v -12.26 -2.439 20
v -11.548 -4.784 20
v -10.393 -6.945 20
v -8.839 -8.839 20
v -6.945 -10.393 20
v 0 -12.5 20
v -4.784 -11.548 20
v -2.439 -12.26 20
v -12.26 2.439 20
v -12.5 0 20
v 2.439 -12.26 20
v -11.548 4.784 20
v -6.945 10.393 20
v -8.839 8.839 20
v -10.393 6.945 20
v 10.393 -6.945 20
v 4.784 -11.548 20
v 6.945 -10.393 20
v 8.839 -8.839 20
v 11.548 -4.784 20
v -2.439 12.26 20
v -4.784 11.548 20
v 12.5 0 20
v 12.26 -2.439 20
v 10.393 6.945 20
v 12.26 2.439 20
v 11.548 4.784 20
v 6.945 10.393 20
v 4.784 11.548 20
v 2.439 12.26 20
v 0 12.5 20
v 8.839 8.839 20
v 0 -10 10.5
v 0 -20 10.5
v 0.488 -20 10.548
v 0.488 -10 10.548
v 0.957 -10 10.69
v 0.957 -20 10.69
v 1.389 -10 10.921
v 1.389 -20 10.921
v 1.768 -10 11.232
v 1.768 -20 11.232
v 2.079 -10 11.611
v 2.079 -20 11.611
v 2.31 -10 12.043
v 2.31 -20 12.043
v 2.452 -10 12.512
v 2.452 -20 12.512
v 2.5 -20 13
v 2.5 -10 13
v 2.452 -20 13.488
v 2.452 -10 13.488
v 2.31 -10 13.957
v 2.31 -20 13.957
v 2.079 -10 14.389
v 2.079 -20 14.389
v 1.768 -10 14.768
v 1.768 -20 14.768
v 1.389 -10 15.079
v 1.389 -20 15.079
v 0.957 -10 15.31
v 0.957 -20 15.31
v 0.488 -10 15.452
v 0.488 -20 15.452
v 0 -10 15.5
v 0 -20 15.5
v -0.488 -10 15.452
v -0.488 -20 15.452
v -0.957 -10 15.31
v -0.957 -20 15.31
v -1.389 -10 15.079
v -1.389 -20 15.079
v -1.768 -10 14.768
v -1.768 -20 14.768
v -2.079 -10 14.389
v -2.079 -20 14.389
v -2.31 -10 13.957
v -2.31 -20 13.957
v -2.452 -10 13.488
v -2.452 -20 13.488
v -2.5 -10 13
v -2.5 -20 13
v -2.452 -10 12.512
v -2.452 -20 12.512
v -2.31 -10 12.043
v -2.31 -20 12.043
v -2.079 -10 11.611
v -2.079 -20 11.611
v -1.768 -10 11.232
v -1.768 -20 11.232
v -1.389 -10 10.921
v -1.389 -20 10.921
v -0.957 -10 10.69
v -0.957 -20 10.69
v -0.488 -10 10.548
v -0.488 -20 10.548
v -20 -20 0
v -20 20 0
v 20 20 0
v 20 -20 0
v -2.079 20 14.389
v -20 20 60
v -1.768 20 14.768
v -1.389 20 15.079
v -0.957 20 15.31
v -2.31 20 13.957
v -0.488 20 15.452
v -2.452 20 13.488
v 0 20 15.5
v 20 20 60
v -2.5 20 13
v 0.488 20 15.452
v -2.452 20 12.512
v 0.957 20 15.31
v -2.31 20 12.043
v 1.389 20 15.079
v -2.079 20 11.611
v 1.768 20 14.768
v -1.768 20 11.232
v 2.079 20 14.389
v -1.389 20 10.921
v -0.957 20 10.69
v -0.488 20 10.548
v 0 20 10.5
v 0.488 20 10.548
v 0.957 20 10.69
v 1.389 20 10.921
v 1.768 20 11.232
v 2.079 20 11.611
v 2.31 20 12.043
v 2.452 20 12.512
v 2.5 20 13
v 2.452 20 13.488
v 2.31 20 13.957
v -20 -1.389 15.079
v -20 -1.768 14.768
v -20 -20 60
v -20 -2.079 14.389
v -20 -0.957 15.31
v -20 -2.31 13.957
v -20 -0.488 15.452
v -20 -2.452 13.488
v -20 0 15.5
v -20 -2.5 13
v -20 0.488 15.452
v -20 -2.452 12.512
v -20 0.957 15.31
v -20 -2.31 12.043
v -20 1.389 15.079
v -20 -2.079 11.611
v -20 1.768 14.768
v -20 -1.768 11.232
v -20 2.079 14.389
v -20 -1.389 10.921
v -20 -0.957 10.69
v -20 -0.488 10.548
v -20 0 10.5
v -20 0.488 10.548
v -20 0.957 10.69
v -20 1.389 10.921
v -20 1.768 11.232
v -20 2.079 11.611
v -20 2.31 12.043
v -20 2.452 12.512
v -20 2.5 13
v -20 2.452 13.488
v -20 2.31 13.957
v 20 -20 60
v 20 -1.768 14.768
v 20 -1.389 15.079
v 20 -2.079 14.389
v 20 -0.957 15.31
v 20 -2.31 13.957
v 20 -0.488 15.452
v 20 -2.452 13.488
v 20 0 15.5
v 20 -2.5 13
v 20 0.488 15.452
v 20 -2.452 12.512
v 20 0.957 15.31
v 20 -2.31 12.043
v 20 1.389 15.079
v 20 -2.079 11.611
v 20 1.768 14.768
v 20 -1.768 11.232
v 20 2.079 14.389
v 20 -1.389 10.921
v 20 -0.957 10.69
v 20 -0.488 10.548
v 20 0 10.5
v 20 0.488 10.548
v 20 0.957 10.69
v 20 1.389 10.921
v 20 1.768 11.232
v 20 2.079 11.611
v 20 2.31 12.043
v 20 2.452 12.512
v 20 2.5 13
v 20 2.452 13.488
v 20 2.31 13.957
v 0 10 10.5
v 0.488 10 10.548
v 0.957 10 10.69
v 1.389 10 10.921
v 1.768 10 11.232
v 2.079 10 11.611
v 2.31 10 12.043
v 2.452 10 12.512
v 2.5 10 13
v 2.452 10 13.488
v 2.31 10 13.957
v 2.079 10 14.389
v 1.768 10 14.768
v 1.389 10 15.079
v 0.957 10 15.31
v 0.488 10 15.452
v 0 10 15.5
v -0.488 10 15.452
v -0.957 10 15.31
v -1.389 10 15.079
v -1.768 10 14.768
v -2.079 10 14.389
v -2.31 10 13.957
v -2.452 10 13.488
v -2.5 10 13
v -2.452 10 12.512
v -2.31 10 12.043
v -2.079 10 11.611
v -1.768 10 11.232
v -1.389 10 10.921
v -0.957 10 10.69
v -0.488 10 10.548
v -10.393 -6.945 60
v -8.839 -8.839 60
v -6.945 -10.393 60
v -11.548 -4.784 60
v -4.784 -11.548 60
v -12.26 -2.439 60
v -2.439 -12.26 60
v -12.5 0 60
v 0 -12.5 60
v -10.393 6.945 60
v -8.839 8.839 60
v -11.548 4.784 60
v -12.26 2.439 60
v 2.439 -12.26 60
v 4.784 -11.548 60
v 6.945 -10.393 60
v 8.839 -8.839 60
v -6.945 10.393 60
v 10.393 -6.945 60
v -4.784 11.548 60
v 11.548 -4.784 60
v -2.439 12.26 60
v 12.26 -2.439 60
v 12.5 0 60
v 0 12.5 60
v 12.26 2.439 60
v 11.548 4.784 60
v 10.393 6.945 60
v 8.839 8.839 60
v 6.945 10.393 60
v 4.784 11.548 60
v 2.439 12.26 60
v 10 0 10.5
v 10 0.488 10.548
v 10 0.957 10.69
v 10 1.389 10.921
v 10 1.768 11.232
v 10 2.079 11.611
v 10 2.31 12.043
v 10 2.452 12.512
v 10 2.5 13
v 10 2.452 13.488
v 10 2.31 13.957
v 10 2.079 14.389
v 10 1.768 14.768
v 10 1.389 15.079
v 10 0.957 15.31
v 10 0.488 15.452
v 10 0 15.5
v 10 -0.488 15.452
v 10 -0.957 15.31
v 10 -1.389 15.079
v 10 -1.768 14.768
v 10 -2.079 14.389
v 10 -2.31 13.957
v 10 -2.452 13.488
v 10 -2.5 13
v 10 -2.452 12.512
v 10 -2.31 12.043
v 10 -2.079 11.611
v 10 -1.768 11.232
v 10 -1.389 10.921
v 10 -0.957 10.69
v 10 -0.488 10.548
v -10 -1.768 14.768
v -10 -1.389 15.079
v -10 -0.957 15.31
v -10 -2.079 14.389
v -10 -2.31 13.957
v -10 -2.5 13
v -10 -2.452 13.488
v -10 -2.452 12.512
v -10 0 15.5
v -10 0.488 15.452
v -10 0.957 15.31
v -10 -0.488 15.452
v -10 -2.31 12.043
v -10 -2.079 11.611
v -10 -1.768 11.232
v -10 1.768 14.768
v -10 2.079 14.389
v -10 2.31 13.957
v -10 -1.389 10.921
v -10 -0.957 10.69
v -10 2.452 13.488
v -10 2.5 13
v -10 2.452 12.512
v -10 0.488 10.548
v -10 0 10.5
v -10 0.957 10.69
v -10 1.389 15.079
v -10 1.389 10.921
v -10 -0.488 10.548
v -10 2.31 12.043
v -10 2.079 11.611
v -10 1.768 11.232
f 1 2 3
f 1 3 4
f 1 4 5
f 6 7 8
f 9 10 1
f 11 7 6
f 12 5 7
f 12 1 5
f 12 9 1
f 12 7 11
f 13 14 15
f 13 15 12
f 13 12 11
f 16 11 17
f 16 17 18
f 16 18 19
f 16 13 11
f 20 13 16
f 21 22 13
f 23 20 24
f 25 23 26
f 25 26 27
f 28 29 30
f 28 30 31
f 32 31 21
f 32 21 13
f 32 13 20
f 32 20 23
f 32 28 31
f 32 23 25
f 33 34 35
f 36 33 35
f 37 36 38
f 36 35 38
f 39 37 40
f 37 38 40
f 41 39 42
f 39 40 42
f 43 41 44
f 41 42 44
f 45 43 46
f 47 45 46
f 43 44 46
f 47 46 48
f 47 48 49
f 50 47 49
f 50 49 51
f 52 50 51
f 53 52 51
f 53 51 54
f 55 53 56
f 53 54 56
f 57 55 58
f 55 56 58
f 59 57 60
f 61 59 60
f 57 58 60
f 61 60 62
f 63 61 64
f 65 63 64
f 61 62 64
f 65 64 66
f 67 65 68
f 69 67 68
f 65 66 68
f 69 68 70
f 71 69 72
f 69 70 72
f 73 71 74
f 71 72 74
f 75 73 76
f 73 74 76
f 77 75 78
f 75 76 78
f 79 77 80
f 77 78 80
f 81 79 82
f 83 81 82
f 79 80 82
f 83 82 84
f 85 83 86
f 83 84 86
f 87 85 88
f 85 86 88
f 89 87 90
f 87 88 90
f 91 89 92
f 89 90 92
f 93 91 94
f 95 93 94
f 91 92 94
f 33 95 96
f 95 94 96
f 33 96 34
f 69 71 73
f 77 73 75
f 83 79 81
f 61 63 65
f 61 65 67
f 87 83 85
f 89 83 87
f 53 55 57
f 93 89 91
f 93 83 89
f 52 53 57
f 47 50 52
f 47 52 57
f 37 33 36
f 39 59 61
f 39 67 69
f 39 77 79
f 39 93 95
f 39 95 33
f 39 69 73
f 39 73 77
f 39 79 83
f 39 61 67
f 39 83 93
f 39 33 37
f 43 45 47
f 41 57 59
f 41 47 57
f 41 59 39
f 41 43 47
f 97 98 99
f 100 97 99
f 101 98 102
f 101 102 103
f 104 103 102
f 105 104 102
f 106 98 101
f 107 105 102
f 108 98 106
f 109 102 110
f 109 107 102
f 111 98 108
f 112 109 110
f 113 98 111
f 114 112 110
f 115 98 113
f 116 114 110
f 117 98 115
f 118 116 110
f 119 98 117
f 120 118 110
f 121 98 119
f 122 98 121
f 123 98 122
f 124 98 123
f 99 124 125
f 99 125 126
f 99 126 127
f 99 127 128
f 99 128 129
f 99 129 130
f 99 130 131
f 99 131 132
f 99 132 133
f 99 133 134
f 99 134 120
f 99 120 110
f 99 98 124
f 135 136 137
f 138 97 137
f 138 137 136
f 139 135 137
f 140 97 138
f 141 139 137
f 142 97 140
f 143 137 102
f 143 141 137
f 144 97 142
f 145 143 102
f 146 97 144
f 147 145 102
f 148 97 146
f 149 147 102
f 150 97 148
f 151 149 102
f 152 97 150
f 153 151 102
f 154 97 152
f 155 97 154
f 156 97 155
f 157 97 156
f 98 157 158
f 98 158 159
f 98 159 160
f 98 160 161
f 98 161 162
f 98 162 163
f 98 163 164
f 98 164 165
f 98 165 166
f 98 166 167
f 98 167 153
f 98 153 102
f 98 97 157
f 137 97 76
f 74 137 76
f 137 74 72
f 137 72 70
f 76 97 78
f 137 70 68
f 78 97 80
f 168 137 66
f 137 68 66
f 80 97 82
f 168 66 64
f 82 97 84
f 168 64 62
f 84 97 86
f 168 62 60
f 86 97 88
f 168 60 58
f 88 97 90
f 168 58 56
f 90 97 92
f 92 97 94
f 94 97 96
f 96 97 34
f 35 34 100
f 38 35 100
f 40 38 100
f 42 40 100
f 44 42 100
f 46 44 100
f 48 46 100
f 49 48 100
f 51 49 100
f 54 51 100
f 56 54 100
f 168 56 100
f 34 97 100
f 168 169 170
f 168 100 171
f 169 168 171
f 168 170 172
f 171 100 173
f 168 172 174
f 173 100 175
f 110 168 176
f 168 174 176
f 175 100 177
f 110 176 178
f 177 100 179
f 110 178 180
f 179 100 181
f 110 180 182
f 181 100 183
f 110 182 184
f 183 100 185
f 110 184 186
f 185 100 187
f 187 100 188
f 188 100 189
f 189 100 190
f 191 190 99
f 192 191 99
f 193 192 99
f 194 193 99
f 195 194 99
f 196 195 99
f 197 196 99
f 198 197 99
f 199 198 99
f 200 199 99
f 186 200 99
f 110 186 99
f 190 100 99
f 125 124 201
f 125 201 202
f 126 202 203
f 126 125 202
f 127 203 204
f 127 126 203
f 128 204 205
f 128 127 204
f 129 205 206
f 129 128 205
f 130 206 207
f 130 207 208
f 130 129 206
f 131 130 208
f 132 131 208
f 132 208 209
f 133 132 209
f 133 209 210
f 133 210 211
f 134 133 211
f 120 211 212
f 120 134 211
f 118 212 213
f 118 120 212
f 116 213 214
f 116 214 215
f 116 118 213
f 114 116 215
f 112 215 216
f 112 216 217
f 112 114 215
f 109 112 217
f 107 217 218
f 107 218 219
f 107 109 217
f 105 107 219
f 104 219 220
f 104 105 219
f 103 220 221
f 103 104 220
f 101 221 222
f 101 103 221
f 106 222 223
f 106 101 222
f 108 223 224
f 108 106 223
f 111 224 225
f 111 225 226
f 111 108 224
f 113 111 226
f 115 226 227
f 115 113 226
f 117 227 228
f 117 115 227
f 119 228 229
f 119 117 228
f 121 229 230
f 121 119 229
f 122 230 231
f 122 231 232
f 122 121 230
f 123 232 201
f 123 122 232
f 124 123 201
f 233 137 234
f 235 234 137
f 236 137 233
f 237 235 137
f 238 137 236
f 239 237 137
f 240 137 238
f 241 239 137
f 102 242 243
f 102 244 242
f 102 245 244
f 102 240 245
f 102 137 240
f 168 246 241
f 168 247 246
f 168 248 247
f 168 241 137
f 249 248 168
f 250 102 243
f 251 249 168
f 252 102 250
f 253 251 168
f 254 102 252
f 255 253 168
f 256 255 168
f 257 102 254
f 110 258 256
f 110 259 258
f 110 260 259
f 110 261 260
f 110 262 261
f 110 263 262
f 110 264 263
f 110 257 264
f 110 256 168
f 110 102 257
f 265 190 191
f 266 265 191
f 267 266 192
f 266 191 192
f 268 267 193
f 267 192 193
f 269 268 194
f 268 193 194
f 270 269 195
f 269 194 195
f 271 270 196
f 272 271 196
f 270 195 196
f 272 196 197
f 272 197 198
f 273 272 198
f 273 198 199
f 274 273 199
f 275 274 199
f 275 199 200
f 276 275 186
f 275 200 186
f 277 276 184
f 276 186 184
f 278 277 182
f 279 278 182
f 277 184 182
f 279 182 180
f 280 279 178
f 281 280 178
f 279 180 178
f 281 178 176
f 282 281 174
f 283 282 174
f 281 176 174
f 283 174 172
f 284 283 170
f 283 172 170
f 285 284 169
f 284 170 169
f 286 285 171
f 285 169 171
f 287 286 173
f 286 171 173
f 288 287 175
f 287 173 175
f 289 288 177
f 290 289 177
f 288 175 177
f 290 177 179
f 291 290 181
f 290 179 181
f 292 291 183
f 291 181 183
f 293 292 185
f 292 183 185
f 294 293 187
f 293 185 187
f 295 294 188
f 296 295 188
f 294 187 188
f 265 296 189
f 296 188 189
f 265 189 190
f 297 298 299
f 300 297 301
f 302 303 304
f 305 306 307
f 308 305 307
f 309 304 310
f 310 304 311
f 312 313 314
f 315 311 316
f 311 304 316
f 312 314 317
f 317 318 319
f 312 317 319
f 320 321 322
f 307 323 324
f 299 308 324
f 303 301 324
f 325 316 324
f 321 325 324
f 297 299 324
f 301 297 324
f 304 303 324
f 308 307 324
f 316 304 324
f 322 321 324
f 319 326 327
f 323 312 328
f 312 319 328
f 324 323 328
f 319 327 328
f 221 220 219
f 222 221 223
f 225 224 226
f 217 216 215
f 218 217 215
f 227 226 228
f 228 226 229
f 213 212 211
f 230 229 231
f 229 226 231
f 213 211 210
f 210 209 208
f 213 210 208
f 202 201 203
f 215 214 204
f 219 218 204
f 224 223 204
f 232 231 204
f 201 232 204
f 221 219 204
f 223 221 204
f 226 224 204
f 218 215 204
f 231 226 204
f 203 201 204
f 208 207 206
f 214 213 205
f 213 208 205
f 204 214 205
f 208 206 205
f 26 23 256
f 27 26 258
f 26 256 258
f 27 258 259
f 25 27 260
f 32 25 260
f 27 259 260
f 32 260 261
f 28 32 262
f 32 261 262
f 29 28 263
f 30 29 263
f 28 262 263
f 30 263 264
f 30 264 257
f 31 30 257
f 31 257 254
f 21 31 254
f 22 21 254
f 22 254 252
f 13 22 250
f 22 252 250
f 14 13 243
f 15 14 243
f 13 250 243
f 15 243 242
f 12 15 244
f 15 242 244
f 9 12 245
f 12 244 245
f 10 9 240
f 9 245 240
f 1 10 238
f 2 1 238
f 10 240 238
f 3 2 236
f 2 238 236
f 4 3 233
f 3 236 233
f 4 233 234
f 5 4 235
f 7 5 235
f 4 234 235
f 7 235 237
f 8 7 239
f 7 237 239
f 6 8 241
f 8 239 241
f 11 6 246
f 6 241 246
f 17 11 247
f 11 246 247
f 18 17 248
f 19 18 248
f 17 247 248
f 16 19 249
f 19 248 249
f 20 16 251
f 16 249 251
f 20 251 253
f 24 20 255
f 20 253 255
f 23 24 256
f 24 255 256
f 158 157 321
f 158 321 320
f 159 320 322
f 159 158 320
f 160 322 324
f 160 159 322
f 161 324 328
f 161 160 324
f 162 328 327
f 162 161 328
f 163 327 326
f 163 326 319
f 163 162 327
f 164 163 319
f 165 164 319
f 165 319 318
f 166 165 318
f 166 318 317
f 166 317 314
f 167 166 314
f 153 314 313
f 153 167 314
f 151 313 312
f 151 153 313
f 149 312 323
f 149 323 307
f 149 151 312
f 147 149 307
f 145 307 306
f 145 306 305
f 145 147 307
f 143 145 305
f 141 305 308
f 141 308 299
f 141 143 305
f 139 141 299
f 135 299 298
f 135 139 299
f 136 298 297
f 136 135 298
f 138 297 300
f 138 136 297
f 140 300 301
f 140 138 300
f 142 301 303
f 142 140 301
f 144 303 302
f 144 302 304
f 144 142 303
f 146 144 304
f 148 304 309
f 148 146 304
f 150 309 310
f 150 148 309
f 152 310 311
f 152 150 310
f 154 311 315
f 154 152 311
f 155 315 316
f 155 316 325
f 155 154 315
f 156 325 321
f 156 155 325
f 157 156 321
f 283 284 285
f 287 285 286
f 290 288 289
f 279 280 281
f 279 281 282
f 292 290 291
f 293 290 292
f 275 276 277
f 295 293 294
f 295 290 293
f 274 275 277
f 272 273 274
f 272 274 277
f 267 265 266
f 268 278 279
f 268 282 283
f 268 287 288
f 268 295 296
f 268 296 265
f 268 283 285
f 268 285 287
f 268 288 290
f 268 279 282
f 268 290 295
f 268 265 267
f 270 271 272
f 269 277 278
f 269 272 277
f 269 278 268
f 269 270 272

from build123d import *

# Parameters (mm, degrees)
SKETCH_1_W          = 40
SKETCH_1_H          = 40
EXTRUDE_1_DEPTH     = 60
SKETCH_7_R          = 2.5
CUT_EXTRUDE_1_DEPTH = 10
SKETCH_8_R          = 2.5
CUT_EXTRUDE_2_DEPTH = 10
SKETCH_10_R         = 12.5
CUT_EXTRUDE_3_DEPTH = 40


with BuildPart() as part:
    # 草图1 → 凸台-拉伸1 (new body)
    with BuildSketch(Plane.XY):
        Rectangle(SKETCH_1_W, SKETCH_1_H)
    extrude(amount=EXTRUDE_1_DEPTH)

    # 草图7 → 切除-拉伸1 (cut)
    with BuildSketch(Plane.XZ.offset(20)):
        with Locations(Location((0, 13, 0), (0, 0, 270))):
            Circle(SKETCH_7_R)
    cut_extrude_1 = extrude(amount=-CUT_EXTRUDE_1_DEPTH, mode=Mode.SUBTRACT)

    # 草图8 → 切除-拉伸2 (cut)
    with BuildSketch(Plane(origin=(20, 0, 0), x_dir=(0, 0, -1), z_dir=(1, 0, 0))):
        with Locations((-13, 0)):
            Circle(SKETCH_8_R)
    cut_extrude_2 = extrude(amount=-CUT_EXTRUDE_2_DEPTH, mode=Mode.SUBTRACT)

    # 镜向1: 切除-拉伸1 across plane
    add(cut_extrude_1.mirror(Plane.ZX), mode=Mode.SUBTRACT)

    # 镜向2: 切除-拉伸2 across plane
    add(cut_extrude_2.mirror(Plane(origin=(0, 0, 0), x_dir=(0, 0, 1), z_dir=(1, 0, 0))), mode=Mode.SUBTRACT)

    # 草图10 → 切除-拉伸3 (cut)
    with BuildSketch(Plane.XY.offset(60)):
        Circle(SKETCH_10_R)
    extrude(amount=-CUT_EXTRUDE_3_DEPTH, mode=Mode.SUBTRACT)


solid = part.part
